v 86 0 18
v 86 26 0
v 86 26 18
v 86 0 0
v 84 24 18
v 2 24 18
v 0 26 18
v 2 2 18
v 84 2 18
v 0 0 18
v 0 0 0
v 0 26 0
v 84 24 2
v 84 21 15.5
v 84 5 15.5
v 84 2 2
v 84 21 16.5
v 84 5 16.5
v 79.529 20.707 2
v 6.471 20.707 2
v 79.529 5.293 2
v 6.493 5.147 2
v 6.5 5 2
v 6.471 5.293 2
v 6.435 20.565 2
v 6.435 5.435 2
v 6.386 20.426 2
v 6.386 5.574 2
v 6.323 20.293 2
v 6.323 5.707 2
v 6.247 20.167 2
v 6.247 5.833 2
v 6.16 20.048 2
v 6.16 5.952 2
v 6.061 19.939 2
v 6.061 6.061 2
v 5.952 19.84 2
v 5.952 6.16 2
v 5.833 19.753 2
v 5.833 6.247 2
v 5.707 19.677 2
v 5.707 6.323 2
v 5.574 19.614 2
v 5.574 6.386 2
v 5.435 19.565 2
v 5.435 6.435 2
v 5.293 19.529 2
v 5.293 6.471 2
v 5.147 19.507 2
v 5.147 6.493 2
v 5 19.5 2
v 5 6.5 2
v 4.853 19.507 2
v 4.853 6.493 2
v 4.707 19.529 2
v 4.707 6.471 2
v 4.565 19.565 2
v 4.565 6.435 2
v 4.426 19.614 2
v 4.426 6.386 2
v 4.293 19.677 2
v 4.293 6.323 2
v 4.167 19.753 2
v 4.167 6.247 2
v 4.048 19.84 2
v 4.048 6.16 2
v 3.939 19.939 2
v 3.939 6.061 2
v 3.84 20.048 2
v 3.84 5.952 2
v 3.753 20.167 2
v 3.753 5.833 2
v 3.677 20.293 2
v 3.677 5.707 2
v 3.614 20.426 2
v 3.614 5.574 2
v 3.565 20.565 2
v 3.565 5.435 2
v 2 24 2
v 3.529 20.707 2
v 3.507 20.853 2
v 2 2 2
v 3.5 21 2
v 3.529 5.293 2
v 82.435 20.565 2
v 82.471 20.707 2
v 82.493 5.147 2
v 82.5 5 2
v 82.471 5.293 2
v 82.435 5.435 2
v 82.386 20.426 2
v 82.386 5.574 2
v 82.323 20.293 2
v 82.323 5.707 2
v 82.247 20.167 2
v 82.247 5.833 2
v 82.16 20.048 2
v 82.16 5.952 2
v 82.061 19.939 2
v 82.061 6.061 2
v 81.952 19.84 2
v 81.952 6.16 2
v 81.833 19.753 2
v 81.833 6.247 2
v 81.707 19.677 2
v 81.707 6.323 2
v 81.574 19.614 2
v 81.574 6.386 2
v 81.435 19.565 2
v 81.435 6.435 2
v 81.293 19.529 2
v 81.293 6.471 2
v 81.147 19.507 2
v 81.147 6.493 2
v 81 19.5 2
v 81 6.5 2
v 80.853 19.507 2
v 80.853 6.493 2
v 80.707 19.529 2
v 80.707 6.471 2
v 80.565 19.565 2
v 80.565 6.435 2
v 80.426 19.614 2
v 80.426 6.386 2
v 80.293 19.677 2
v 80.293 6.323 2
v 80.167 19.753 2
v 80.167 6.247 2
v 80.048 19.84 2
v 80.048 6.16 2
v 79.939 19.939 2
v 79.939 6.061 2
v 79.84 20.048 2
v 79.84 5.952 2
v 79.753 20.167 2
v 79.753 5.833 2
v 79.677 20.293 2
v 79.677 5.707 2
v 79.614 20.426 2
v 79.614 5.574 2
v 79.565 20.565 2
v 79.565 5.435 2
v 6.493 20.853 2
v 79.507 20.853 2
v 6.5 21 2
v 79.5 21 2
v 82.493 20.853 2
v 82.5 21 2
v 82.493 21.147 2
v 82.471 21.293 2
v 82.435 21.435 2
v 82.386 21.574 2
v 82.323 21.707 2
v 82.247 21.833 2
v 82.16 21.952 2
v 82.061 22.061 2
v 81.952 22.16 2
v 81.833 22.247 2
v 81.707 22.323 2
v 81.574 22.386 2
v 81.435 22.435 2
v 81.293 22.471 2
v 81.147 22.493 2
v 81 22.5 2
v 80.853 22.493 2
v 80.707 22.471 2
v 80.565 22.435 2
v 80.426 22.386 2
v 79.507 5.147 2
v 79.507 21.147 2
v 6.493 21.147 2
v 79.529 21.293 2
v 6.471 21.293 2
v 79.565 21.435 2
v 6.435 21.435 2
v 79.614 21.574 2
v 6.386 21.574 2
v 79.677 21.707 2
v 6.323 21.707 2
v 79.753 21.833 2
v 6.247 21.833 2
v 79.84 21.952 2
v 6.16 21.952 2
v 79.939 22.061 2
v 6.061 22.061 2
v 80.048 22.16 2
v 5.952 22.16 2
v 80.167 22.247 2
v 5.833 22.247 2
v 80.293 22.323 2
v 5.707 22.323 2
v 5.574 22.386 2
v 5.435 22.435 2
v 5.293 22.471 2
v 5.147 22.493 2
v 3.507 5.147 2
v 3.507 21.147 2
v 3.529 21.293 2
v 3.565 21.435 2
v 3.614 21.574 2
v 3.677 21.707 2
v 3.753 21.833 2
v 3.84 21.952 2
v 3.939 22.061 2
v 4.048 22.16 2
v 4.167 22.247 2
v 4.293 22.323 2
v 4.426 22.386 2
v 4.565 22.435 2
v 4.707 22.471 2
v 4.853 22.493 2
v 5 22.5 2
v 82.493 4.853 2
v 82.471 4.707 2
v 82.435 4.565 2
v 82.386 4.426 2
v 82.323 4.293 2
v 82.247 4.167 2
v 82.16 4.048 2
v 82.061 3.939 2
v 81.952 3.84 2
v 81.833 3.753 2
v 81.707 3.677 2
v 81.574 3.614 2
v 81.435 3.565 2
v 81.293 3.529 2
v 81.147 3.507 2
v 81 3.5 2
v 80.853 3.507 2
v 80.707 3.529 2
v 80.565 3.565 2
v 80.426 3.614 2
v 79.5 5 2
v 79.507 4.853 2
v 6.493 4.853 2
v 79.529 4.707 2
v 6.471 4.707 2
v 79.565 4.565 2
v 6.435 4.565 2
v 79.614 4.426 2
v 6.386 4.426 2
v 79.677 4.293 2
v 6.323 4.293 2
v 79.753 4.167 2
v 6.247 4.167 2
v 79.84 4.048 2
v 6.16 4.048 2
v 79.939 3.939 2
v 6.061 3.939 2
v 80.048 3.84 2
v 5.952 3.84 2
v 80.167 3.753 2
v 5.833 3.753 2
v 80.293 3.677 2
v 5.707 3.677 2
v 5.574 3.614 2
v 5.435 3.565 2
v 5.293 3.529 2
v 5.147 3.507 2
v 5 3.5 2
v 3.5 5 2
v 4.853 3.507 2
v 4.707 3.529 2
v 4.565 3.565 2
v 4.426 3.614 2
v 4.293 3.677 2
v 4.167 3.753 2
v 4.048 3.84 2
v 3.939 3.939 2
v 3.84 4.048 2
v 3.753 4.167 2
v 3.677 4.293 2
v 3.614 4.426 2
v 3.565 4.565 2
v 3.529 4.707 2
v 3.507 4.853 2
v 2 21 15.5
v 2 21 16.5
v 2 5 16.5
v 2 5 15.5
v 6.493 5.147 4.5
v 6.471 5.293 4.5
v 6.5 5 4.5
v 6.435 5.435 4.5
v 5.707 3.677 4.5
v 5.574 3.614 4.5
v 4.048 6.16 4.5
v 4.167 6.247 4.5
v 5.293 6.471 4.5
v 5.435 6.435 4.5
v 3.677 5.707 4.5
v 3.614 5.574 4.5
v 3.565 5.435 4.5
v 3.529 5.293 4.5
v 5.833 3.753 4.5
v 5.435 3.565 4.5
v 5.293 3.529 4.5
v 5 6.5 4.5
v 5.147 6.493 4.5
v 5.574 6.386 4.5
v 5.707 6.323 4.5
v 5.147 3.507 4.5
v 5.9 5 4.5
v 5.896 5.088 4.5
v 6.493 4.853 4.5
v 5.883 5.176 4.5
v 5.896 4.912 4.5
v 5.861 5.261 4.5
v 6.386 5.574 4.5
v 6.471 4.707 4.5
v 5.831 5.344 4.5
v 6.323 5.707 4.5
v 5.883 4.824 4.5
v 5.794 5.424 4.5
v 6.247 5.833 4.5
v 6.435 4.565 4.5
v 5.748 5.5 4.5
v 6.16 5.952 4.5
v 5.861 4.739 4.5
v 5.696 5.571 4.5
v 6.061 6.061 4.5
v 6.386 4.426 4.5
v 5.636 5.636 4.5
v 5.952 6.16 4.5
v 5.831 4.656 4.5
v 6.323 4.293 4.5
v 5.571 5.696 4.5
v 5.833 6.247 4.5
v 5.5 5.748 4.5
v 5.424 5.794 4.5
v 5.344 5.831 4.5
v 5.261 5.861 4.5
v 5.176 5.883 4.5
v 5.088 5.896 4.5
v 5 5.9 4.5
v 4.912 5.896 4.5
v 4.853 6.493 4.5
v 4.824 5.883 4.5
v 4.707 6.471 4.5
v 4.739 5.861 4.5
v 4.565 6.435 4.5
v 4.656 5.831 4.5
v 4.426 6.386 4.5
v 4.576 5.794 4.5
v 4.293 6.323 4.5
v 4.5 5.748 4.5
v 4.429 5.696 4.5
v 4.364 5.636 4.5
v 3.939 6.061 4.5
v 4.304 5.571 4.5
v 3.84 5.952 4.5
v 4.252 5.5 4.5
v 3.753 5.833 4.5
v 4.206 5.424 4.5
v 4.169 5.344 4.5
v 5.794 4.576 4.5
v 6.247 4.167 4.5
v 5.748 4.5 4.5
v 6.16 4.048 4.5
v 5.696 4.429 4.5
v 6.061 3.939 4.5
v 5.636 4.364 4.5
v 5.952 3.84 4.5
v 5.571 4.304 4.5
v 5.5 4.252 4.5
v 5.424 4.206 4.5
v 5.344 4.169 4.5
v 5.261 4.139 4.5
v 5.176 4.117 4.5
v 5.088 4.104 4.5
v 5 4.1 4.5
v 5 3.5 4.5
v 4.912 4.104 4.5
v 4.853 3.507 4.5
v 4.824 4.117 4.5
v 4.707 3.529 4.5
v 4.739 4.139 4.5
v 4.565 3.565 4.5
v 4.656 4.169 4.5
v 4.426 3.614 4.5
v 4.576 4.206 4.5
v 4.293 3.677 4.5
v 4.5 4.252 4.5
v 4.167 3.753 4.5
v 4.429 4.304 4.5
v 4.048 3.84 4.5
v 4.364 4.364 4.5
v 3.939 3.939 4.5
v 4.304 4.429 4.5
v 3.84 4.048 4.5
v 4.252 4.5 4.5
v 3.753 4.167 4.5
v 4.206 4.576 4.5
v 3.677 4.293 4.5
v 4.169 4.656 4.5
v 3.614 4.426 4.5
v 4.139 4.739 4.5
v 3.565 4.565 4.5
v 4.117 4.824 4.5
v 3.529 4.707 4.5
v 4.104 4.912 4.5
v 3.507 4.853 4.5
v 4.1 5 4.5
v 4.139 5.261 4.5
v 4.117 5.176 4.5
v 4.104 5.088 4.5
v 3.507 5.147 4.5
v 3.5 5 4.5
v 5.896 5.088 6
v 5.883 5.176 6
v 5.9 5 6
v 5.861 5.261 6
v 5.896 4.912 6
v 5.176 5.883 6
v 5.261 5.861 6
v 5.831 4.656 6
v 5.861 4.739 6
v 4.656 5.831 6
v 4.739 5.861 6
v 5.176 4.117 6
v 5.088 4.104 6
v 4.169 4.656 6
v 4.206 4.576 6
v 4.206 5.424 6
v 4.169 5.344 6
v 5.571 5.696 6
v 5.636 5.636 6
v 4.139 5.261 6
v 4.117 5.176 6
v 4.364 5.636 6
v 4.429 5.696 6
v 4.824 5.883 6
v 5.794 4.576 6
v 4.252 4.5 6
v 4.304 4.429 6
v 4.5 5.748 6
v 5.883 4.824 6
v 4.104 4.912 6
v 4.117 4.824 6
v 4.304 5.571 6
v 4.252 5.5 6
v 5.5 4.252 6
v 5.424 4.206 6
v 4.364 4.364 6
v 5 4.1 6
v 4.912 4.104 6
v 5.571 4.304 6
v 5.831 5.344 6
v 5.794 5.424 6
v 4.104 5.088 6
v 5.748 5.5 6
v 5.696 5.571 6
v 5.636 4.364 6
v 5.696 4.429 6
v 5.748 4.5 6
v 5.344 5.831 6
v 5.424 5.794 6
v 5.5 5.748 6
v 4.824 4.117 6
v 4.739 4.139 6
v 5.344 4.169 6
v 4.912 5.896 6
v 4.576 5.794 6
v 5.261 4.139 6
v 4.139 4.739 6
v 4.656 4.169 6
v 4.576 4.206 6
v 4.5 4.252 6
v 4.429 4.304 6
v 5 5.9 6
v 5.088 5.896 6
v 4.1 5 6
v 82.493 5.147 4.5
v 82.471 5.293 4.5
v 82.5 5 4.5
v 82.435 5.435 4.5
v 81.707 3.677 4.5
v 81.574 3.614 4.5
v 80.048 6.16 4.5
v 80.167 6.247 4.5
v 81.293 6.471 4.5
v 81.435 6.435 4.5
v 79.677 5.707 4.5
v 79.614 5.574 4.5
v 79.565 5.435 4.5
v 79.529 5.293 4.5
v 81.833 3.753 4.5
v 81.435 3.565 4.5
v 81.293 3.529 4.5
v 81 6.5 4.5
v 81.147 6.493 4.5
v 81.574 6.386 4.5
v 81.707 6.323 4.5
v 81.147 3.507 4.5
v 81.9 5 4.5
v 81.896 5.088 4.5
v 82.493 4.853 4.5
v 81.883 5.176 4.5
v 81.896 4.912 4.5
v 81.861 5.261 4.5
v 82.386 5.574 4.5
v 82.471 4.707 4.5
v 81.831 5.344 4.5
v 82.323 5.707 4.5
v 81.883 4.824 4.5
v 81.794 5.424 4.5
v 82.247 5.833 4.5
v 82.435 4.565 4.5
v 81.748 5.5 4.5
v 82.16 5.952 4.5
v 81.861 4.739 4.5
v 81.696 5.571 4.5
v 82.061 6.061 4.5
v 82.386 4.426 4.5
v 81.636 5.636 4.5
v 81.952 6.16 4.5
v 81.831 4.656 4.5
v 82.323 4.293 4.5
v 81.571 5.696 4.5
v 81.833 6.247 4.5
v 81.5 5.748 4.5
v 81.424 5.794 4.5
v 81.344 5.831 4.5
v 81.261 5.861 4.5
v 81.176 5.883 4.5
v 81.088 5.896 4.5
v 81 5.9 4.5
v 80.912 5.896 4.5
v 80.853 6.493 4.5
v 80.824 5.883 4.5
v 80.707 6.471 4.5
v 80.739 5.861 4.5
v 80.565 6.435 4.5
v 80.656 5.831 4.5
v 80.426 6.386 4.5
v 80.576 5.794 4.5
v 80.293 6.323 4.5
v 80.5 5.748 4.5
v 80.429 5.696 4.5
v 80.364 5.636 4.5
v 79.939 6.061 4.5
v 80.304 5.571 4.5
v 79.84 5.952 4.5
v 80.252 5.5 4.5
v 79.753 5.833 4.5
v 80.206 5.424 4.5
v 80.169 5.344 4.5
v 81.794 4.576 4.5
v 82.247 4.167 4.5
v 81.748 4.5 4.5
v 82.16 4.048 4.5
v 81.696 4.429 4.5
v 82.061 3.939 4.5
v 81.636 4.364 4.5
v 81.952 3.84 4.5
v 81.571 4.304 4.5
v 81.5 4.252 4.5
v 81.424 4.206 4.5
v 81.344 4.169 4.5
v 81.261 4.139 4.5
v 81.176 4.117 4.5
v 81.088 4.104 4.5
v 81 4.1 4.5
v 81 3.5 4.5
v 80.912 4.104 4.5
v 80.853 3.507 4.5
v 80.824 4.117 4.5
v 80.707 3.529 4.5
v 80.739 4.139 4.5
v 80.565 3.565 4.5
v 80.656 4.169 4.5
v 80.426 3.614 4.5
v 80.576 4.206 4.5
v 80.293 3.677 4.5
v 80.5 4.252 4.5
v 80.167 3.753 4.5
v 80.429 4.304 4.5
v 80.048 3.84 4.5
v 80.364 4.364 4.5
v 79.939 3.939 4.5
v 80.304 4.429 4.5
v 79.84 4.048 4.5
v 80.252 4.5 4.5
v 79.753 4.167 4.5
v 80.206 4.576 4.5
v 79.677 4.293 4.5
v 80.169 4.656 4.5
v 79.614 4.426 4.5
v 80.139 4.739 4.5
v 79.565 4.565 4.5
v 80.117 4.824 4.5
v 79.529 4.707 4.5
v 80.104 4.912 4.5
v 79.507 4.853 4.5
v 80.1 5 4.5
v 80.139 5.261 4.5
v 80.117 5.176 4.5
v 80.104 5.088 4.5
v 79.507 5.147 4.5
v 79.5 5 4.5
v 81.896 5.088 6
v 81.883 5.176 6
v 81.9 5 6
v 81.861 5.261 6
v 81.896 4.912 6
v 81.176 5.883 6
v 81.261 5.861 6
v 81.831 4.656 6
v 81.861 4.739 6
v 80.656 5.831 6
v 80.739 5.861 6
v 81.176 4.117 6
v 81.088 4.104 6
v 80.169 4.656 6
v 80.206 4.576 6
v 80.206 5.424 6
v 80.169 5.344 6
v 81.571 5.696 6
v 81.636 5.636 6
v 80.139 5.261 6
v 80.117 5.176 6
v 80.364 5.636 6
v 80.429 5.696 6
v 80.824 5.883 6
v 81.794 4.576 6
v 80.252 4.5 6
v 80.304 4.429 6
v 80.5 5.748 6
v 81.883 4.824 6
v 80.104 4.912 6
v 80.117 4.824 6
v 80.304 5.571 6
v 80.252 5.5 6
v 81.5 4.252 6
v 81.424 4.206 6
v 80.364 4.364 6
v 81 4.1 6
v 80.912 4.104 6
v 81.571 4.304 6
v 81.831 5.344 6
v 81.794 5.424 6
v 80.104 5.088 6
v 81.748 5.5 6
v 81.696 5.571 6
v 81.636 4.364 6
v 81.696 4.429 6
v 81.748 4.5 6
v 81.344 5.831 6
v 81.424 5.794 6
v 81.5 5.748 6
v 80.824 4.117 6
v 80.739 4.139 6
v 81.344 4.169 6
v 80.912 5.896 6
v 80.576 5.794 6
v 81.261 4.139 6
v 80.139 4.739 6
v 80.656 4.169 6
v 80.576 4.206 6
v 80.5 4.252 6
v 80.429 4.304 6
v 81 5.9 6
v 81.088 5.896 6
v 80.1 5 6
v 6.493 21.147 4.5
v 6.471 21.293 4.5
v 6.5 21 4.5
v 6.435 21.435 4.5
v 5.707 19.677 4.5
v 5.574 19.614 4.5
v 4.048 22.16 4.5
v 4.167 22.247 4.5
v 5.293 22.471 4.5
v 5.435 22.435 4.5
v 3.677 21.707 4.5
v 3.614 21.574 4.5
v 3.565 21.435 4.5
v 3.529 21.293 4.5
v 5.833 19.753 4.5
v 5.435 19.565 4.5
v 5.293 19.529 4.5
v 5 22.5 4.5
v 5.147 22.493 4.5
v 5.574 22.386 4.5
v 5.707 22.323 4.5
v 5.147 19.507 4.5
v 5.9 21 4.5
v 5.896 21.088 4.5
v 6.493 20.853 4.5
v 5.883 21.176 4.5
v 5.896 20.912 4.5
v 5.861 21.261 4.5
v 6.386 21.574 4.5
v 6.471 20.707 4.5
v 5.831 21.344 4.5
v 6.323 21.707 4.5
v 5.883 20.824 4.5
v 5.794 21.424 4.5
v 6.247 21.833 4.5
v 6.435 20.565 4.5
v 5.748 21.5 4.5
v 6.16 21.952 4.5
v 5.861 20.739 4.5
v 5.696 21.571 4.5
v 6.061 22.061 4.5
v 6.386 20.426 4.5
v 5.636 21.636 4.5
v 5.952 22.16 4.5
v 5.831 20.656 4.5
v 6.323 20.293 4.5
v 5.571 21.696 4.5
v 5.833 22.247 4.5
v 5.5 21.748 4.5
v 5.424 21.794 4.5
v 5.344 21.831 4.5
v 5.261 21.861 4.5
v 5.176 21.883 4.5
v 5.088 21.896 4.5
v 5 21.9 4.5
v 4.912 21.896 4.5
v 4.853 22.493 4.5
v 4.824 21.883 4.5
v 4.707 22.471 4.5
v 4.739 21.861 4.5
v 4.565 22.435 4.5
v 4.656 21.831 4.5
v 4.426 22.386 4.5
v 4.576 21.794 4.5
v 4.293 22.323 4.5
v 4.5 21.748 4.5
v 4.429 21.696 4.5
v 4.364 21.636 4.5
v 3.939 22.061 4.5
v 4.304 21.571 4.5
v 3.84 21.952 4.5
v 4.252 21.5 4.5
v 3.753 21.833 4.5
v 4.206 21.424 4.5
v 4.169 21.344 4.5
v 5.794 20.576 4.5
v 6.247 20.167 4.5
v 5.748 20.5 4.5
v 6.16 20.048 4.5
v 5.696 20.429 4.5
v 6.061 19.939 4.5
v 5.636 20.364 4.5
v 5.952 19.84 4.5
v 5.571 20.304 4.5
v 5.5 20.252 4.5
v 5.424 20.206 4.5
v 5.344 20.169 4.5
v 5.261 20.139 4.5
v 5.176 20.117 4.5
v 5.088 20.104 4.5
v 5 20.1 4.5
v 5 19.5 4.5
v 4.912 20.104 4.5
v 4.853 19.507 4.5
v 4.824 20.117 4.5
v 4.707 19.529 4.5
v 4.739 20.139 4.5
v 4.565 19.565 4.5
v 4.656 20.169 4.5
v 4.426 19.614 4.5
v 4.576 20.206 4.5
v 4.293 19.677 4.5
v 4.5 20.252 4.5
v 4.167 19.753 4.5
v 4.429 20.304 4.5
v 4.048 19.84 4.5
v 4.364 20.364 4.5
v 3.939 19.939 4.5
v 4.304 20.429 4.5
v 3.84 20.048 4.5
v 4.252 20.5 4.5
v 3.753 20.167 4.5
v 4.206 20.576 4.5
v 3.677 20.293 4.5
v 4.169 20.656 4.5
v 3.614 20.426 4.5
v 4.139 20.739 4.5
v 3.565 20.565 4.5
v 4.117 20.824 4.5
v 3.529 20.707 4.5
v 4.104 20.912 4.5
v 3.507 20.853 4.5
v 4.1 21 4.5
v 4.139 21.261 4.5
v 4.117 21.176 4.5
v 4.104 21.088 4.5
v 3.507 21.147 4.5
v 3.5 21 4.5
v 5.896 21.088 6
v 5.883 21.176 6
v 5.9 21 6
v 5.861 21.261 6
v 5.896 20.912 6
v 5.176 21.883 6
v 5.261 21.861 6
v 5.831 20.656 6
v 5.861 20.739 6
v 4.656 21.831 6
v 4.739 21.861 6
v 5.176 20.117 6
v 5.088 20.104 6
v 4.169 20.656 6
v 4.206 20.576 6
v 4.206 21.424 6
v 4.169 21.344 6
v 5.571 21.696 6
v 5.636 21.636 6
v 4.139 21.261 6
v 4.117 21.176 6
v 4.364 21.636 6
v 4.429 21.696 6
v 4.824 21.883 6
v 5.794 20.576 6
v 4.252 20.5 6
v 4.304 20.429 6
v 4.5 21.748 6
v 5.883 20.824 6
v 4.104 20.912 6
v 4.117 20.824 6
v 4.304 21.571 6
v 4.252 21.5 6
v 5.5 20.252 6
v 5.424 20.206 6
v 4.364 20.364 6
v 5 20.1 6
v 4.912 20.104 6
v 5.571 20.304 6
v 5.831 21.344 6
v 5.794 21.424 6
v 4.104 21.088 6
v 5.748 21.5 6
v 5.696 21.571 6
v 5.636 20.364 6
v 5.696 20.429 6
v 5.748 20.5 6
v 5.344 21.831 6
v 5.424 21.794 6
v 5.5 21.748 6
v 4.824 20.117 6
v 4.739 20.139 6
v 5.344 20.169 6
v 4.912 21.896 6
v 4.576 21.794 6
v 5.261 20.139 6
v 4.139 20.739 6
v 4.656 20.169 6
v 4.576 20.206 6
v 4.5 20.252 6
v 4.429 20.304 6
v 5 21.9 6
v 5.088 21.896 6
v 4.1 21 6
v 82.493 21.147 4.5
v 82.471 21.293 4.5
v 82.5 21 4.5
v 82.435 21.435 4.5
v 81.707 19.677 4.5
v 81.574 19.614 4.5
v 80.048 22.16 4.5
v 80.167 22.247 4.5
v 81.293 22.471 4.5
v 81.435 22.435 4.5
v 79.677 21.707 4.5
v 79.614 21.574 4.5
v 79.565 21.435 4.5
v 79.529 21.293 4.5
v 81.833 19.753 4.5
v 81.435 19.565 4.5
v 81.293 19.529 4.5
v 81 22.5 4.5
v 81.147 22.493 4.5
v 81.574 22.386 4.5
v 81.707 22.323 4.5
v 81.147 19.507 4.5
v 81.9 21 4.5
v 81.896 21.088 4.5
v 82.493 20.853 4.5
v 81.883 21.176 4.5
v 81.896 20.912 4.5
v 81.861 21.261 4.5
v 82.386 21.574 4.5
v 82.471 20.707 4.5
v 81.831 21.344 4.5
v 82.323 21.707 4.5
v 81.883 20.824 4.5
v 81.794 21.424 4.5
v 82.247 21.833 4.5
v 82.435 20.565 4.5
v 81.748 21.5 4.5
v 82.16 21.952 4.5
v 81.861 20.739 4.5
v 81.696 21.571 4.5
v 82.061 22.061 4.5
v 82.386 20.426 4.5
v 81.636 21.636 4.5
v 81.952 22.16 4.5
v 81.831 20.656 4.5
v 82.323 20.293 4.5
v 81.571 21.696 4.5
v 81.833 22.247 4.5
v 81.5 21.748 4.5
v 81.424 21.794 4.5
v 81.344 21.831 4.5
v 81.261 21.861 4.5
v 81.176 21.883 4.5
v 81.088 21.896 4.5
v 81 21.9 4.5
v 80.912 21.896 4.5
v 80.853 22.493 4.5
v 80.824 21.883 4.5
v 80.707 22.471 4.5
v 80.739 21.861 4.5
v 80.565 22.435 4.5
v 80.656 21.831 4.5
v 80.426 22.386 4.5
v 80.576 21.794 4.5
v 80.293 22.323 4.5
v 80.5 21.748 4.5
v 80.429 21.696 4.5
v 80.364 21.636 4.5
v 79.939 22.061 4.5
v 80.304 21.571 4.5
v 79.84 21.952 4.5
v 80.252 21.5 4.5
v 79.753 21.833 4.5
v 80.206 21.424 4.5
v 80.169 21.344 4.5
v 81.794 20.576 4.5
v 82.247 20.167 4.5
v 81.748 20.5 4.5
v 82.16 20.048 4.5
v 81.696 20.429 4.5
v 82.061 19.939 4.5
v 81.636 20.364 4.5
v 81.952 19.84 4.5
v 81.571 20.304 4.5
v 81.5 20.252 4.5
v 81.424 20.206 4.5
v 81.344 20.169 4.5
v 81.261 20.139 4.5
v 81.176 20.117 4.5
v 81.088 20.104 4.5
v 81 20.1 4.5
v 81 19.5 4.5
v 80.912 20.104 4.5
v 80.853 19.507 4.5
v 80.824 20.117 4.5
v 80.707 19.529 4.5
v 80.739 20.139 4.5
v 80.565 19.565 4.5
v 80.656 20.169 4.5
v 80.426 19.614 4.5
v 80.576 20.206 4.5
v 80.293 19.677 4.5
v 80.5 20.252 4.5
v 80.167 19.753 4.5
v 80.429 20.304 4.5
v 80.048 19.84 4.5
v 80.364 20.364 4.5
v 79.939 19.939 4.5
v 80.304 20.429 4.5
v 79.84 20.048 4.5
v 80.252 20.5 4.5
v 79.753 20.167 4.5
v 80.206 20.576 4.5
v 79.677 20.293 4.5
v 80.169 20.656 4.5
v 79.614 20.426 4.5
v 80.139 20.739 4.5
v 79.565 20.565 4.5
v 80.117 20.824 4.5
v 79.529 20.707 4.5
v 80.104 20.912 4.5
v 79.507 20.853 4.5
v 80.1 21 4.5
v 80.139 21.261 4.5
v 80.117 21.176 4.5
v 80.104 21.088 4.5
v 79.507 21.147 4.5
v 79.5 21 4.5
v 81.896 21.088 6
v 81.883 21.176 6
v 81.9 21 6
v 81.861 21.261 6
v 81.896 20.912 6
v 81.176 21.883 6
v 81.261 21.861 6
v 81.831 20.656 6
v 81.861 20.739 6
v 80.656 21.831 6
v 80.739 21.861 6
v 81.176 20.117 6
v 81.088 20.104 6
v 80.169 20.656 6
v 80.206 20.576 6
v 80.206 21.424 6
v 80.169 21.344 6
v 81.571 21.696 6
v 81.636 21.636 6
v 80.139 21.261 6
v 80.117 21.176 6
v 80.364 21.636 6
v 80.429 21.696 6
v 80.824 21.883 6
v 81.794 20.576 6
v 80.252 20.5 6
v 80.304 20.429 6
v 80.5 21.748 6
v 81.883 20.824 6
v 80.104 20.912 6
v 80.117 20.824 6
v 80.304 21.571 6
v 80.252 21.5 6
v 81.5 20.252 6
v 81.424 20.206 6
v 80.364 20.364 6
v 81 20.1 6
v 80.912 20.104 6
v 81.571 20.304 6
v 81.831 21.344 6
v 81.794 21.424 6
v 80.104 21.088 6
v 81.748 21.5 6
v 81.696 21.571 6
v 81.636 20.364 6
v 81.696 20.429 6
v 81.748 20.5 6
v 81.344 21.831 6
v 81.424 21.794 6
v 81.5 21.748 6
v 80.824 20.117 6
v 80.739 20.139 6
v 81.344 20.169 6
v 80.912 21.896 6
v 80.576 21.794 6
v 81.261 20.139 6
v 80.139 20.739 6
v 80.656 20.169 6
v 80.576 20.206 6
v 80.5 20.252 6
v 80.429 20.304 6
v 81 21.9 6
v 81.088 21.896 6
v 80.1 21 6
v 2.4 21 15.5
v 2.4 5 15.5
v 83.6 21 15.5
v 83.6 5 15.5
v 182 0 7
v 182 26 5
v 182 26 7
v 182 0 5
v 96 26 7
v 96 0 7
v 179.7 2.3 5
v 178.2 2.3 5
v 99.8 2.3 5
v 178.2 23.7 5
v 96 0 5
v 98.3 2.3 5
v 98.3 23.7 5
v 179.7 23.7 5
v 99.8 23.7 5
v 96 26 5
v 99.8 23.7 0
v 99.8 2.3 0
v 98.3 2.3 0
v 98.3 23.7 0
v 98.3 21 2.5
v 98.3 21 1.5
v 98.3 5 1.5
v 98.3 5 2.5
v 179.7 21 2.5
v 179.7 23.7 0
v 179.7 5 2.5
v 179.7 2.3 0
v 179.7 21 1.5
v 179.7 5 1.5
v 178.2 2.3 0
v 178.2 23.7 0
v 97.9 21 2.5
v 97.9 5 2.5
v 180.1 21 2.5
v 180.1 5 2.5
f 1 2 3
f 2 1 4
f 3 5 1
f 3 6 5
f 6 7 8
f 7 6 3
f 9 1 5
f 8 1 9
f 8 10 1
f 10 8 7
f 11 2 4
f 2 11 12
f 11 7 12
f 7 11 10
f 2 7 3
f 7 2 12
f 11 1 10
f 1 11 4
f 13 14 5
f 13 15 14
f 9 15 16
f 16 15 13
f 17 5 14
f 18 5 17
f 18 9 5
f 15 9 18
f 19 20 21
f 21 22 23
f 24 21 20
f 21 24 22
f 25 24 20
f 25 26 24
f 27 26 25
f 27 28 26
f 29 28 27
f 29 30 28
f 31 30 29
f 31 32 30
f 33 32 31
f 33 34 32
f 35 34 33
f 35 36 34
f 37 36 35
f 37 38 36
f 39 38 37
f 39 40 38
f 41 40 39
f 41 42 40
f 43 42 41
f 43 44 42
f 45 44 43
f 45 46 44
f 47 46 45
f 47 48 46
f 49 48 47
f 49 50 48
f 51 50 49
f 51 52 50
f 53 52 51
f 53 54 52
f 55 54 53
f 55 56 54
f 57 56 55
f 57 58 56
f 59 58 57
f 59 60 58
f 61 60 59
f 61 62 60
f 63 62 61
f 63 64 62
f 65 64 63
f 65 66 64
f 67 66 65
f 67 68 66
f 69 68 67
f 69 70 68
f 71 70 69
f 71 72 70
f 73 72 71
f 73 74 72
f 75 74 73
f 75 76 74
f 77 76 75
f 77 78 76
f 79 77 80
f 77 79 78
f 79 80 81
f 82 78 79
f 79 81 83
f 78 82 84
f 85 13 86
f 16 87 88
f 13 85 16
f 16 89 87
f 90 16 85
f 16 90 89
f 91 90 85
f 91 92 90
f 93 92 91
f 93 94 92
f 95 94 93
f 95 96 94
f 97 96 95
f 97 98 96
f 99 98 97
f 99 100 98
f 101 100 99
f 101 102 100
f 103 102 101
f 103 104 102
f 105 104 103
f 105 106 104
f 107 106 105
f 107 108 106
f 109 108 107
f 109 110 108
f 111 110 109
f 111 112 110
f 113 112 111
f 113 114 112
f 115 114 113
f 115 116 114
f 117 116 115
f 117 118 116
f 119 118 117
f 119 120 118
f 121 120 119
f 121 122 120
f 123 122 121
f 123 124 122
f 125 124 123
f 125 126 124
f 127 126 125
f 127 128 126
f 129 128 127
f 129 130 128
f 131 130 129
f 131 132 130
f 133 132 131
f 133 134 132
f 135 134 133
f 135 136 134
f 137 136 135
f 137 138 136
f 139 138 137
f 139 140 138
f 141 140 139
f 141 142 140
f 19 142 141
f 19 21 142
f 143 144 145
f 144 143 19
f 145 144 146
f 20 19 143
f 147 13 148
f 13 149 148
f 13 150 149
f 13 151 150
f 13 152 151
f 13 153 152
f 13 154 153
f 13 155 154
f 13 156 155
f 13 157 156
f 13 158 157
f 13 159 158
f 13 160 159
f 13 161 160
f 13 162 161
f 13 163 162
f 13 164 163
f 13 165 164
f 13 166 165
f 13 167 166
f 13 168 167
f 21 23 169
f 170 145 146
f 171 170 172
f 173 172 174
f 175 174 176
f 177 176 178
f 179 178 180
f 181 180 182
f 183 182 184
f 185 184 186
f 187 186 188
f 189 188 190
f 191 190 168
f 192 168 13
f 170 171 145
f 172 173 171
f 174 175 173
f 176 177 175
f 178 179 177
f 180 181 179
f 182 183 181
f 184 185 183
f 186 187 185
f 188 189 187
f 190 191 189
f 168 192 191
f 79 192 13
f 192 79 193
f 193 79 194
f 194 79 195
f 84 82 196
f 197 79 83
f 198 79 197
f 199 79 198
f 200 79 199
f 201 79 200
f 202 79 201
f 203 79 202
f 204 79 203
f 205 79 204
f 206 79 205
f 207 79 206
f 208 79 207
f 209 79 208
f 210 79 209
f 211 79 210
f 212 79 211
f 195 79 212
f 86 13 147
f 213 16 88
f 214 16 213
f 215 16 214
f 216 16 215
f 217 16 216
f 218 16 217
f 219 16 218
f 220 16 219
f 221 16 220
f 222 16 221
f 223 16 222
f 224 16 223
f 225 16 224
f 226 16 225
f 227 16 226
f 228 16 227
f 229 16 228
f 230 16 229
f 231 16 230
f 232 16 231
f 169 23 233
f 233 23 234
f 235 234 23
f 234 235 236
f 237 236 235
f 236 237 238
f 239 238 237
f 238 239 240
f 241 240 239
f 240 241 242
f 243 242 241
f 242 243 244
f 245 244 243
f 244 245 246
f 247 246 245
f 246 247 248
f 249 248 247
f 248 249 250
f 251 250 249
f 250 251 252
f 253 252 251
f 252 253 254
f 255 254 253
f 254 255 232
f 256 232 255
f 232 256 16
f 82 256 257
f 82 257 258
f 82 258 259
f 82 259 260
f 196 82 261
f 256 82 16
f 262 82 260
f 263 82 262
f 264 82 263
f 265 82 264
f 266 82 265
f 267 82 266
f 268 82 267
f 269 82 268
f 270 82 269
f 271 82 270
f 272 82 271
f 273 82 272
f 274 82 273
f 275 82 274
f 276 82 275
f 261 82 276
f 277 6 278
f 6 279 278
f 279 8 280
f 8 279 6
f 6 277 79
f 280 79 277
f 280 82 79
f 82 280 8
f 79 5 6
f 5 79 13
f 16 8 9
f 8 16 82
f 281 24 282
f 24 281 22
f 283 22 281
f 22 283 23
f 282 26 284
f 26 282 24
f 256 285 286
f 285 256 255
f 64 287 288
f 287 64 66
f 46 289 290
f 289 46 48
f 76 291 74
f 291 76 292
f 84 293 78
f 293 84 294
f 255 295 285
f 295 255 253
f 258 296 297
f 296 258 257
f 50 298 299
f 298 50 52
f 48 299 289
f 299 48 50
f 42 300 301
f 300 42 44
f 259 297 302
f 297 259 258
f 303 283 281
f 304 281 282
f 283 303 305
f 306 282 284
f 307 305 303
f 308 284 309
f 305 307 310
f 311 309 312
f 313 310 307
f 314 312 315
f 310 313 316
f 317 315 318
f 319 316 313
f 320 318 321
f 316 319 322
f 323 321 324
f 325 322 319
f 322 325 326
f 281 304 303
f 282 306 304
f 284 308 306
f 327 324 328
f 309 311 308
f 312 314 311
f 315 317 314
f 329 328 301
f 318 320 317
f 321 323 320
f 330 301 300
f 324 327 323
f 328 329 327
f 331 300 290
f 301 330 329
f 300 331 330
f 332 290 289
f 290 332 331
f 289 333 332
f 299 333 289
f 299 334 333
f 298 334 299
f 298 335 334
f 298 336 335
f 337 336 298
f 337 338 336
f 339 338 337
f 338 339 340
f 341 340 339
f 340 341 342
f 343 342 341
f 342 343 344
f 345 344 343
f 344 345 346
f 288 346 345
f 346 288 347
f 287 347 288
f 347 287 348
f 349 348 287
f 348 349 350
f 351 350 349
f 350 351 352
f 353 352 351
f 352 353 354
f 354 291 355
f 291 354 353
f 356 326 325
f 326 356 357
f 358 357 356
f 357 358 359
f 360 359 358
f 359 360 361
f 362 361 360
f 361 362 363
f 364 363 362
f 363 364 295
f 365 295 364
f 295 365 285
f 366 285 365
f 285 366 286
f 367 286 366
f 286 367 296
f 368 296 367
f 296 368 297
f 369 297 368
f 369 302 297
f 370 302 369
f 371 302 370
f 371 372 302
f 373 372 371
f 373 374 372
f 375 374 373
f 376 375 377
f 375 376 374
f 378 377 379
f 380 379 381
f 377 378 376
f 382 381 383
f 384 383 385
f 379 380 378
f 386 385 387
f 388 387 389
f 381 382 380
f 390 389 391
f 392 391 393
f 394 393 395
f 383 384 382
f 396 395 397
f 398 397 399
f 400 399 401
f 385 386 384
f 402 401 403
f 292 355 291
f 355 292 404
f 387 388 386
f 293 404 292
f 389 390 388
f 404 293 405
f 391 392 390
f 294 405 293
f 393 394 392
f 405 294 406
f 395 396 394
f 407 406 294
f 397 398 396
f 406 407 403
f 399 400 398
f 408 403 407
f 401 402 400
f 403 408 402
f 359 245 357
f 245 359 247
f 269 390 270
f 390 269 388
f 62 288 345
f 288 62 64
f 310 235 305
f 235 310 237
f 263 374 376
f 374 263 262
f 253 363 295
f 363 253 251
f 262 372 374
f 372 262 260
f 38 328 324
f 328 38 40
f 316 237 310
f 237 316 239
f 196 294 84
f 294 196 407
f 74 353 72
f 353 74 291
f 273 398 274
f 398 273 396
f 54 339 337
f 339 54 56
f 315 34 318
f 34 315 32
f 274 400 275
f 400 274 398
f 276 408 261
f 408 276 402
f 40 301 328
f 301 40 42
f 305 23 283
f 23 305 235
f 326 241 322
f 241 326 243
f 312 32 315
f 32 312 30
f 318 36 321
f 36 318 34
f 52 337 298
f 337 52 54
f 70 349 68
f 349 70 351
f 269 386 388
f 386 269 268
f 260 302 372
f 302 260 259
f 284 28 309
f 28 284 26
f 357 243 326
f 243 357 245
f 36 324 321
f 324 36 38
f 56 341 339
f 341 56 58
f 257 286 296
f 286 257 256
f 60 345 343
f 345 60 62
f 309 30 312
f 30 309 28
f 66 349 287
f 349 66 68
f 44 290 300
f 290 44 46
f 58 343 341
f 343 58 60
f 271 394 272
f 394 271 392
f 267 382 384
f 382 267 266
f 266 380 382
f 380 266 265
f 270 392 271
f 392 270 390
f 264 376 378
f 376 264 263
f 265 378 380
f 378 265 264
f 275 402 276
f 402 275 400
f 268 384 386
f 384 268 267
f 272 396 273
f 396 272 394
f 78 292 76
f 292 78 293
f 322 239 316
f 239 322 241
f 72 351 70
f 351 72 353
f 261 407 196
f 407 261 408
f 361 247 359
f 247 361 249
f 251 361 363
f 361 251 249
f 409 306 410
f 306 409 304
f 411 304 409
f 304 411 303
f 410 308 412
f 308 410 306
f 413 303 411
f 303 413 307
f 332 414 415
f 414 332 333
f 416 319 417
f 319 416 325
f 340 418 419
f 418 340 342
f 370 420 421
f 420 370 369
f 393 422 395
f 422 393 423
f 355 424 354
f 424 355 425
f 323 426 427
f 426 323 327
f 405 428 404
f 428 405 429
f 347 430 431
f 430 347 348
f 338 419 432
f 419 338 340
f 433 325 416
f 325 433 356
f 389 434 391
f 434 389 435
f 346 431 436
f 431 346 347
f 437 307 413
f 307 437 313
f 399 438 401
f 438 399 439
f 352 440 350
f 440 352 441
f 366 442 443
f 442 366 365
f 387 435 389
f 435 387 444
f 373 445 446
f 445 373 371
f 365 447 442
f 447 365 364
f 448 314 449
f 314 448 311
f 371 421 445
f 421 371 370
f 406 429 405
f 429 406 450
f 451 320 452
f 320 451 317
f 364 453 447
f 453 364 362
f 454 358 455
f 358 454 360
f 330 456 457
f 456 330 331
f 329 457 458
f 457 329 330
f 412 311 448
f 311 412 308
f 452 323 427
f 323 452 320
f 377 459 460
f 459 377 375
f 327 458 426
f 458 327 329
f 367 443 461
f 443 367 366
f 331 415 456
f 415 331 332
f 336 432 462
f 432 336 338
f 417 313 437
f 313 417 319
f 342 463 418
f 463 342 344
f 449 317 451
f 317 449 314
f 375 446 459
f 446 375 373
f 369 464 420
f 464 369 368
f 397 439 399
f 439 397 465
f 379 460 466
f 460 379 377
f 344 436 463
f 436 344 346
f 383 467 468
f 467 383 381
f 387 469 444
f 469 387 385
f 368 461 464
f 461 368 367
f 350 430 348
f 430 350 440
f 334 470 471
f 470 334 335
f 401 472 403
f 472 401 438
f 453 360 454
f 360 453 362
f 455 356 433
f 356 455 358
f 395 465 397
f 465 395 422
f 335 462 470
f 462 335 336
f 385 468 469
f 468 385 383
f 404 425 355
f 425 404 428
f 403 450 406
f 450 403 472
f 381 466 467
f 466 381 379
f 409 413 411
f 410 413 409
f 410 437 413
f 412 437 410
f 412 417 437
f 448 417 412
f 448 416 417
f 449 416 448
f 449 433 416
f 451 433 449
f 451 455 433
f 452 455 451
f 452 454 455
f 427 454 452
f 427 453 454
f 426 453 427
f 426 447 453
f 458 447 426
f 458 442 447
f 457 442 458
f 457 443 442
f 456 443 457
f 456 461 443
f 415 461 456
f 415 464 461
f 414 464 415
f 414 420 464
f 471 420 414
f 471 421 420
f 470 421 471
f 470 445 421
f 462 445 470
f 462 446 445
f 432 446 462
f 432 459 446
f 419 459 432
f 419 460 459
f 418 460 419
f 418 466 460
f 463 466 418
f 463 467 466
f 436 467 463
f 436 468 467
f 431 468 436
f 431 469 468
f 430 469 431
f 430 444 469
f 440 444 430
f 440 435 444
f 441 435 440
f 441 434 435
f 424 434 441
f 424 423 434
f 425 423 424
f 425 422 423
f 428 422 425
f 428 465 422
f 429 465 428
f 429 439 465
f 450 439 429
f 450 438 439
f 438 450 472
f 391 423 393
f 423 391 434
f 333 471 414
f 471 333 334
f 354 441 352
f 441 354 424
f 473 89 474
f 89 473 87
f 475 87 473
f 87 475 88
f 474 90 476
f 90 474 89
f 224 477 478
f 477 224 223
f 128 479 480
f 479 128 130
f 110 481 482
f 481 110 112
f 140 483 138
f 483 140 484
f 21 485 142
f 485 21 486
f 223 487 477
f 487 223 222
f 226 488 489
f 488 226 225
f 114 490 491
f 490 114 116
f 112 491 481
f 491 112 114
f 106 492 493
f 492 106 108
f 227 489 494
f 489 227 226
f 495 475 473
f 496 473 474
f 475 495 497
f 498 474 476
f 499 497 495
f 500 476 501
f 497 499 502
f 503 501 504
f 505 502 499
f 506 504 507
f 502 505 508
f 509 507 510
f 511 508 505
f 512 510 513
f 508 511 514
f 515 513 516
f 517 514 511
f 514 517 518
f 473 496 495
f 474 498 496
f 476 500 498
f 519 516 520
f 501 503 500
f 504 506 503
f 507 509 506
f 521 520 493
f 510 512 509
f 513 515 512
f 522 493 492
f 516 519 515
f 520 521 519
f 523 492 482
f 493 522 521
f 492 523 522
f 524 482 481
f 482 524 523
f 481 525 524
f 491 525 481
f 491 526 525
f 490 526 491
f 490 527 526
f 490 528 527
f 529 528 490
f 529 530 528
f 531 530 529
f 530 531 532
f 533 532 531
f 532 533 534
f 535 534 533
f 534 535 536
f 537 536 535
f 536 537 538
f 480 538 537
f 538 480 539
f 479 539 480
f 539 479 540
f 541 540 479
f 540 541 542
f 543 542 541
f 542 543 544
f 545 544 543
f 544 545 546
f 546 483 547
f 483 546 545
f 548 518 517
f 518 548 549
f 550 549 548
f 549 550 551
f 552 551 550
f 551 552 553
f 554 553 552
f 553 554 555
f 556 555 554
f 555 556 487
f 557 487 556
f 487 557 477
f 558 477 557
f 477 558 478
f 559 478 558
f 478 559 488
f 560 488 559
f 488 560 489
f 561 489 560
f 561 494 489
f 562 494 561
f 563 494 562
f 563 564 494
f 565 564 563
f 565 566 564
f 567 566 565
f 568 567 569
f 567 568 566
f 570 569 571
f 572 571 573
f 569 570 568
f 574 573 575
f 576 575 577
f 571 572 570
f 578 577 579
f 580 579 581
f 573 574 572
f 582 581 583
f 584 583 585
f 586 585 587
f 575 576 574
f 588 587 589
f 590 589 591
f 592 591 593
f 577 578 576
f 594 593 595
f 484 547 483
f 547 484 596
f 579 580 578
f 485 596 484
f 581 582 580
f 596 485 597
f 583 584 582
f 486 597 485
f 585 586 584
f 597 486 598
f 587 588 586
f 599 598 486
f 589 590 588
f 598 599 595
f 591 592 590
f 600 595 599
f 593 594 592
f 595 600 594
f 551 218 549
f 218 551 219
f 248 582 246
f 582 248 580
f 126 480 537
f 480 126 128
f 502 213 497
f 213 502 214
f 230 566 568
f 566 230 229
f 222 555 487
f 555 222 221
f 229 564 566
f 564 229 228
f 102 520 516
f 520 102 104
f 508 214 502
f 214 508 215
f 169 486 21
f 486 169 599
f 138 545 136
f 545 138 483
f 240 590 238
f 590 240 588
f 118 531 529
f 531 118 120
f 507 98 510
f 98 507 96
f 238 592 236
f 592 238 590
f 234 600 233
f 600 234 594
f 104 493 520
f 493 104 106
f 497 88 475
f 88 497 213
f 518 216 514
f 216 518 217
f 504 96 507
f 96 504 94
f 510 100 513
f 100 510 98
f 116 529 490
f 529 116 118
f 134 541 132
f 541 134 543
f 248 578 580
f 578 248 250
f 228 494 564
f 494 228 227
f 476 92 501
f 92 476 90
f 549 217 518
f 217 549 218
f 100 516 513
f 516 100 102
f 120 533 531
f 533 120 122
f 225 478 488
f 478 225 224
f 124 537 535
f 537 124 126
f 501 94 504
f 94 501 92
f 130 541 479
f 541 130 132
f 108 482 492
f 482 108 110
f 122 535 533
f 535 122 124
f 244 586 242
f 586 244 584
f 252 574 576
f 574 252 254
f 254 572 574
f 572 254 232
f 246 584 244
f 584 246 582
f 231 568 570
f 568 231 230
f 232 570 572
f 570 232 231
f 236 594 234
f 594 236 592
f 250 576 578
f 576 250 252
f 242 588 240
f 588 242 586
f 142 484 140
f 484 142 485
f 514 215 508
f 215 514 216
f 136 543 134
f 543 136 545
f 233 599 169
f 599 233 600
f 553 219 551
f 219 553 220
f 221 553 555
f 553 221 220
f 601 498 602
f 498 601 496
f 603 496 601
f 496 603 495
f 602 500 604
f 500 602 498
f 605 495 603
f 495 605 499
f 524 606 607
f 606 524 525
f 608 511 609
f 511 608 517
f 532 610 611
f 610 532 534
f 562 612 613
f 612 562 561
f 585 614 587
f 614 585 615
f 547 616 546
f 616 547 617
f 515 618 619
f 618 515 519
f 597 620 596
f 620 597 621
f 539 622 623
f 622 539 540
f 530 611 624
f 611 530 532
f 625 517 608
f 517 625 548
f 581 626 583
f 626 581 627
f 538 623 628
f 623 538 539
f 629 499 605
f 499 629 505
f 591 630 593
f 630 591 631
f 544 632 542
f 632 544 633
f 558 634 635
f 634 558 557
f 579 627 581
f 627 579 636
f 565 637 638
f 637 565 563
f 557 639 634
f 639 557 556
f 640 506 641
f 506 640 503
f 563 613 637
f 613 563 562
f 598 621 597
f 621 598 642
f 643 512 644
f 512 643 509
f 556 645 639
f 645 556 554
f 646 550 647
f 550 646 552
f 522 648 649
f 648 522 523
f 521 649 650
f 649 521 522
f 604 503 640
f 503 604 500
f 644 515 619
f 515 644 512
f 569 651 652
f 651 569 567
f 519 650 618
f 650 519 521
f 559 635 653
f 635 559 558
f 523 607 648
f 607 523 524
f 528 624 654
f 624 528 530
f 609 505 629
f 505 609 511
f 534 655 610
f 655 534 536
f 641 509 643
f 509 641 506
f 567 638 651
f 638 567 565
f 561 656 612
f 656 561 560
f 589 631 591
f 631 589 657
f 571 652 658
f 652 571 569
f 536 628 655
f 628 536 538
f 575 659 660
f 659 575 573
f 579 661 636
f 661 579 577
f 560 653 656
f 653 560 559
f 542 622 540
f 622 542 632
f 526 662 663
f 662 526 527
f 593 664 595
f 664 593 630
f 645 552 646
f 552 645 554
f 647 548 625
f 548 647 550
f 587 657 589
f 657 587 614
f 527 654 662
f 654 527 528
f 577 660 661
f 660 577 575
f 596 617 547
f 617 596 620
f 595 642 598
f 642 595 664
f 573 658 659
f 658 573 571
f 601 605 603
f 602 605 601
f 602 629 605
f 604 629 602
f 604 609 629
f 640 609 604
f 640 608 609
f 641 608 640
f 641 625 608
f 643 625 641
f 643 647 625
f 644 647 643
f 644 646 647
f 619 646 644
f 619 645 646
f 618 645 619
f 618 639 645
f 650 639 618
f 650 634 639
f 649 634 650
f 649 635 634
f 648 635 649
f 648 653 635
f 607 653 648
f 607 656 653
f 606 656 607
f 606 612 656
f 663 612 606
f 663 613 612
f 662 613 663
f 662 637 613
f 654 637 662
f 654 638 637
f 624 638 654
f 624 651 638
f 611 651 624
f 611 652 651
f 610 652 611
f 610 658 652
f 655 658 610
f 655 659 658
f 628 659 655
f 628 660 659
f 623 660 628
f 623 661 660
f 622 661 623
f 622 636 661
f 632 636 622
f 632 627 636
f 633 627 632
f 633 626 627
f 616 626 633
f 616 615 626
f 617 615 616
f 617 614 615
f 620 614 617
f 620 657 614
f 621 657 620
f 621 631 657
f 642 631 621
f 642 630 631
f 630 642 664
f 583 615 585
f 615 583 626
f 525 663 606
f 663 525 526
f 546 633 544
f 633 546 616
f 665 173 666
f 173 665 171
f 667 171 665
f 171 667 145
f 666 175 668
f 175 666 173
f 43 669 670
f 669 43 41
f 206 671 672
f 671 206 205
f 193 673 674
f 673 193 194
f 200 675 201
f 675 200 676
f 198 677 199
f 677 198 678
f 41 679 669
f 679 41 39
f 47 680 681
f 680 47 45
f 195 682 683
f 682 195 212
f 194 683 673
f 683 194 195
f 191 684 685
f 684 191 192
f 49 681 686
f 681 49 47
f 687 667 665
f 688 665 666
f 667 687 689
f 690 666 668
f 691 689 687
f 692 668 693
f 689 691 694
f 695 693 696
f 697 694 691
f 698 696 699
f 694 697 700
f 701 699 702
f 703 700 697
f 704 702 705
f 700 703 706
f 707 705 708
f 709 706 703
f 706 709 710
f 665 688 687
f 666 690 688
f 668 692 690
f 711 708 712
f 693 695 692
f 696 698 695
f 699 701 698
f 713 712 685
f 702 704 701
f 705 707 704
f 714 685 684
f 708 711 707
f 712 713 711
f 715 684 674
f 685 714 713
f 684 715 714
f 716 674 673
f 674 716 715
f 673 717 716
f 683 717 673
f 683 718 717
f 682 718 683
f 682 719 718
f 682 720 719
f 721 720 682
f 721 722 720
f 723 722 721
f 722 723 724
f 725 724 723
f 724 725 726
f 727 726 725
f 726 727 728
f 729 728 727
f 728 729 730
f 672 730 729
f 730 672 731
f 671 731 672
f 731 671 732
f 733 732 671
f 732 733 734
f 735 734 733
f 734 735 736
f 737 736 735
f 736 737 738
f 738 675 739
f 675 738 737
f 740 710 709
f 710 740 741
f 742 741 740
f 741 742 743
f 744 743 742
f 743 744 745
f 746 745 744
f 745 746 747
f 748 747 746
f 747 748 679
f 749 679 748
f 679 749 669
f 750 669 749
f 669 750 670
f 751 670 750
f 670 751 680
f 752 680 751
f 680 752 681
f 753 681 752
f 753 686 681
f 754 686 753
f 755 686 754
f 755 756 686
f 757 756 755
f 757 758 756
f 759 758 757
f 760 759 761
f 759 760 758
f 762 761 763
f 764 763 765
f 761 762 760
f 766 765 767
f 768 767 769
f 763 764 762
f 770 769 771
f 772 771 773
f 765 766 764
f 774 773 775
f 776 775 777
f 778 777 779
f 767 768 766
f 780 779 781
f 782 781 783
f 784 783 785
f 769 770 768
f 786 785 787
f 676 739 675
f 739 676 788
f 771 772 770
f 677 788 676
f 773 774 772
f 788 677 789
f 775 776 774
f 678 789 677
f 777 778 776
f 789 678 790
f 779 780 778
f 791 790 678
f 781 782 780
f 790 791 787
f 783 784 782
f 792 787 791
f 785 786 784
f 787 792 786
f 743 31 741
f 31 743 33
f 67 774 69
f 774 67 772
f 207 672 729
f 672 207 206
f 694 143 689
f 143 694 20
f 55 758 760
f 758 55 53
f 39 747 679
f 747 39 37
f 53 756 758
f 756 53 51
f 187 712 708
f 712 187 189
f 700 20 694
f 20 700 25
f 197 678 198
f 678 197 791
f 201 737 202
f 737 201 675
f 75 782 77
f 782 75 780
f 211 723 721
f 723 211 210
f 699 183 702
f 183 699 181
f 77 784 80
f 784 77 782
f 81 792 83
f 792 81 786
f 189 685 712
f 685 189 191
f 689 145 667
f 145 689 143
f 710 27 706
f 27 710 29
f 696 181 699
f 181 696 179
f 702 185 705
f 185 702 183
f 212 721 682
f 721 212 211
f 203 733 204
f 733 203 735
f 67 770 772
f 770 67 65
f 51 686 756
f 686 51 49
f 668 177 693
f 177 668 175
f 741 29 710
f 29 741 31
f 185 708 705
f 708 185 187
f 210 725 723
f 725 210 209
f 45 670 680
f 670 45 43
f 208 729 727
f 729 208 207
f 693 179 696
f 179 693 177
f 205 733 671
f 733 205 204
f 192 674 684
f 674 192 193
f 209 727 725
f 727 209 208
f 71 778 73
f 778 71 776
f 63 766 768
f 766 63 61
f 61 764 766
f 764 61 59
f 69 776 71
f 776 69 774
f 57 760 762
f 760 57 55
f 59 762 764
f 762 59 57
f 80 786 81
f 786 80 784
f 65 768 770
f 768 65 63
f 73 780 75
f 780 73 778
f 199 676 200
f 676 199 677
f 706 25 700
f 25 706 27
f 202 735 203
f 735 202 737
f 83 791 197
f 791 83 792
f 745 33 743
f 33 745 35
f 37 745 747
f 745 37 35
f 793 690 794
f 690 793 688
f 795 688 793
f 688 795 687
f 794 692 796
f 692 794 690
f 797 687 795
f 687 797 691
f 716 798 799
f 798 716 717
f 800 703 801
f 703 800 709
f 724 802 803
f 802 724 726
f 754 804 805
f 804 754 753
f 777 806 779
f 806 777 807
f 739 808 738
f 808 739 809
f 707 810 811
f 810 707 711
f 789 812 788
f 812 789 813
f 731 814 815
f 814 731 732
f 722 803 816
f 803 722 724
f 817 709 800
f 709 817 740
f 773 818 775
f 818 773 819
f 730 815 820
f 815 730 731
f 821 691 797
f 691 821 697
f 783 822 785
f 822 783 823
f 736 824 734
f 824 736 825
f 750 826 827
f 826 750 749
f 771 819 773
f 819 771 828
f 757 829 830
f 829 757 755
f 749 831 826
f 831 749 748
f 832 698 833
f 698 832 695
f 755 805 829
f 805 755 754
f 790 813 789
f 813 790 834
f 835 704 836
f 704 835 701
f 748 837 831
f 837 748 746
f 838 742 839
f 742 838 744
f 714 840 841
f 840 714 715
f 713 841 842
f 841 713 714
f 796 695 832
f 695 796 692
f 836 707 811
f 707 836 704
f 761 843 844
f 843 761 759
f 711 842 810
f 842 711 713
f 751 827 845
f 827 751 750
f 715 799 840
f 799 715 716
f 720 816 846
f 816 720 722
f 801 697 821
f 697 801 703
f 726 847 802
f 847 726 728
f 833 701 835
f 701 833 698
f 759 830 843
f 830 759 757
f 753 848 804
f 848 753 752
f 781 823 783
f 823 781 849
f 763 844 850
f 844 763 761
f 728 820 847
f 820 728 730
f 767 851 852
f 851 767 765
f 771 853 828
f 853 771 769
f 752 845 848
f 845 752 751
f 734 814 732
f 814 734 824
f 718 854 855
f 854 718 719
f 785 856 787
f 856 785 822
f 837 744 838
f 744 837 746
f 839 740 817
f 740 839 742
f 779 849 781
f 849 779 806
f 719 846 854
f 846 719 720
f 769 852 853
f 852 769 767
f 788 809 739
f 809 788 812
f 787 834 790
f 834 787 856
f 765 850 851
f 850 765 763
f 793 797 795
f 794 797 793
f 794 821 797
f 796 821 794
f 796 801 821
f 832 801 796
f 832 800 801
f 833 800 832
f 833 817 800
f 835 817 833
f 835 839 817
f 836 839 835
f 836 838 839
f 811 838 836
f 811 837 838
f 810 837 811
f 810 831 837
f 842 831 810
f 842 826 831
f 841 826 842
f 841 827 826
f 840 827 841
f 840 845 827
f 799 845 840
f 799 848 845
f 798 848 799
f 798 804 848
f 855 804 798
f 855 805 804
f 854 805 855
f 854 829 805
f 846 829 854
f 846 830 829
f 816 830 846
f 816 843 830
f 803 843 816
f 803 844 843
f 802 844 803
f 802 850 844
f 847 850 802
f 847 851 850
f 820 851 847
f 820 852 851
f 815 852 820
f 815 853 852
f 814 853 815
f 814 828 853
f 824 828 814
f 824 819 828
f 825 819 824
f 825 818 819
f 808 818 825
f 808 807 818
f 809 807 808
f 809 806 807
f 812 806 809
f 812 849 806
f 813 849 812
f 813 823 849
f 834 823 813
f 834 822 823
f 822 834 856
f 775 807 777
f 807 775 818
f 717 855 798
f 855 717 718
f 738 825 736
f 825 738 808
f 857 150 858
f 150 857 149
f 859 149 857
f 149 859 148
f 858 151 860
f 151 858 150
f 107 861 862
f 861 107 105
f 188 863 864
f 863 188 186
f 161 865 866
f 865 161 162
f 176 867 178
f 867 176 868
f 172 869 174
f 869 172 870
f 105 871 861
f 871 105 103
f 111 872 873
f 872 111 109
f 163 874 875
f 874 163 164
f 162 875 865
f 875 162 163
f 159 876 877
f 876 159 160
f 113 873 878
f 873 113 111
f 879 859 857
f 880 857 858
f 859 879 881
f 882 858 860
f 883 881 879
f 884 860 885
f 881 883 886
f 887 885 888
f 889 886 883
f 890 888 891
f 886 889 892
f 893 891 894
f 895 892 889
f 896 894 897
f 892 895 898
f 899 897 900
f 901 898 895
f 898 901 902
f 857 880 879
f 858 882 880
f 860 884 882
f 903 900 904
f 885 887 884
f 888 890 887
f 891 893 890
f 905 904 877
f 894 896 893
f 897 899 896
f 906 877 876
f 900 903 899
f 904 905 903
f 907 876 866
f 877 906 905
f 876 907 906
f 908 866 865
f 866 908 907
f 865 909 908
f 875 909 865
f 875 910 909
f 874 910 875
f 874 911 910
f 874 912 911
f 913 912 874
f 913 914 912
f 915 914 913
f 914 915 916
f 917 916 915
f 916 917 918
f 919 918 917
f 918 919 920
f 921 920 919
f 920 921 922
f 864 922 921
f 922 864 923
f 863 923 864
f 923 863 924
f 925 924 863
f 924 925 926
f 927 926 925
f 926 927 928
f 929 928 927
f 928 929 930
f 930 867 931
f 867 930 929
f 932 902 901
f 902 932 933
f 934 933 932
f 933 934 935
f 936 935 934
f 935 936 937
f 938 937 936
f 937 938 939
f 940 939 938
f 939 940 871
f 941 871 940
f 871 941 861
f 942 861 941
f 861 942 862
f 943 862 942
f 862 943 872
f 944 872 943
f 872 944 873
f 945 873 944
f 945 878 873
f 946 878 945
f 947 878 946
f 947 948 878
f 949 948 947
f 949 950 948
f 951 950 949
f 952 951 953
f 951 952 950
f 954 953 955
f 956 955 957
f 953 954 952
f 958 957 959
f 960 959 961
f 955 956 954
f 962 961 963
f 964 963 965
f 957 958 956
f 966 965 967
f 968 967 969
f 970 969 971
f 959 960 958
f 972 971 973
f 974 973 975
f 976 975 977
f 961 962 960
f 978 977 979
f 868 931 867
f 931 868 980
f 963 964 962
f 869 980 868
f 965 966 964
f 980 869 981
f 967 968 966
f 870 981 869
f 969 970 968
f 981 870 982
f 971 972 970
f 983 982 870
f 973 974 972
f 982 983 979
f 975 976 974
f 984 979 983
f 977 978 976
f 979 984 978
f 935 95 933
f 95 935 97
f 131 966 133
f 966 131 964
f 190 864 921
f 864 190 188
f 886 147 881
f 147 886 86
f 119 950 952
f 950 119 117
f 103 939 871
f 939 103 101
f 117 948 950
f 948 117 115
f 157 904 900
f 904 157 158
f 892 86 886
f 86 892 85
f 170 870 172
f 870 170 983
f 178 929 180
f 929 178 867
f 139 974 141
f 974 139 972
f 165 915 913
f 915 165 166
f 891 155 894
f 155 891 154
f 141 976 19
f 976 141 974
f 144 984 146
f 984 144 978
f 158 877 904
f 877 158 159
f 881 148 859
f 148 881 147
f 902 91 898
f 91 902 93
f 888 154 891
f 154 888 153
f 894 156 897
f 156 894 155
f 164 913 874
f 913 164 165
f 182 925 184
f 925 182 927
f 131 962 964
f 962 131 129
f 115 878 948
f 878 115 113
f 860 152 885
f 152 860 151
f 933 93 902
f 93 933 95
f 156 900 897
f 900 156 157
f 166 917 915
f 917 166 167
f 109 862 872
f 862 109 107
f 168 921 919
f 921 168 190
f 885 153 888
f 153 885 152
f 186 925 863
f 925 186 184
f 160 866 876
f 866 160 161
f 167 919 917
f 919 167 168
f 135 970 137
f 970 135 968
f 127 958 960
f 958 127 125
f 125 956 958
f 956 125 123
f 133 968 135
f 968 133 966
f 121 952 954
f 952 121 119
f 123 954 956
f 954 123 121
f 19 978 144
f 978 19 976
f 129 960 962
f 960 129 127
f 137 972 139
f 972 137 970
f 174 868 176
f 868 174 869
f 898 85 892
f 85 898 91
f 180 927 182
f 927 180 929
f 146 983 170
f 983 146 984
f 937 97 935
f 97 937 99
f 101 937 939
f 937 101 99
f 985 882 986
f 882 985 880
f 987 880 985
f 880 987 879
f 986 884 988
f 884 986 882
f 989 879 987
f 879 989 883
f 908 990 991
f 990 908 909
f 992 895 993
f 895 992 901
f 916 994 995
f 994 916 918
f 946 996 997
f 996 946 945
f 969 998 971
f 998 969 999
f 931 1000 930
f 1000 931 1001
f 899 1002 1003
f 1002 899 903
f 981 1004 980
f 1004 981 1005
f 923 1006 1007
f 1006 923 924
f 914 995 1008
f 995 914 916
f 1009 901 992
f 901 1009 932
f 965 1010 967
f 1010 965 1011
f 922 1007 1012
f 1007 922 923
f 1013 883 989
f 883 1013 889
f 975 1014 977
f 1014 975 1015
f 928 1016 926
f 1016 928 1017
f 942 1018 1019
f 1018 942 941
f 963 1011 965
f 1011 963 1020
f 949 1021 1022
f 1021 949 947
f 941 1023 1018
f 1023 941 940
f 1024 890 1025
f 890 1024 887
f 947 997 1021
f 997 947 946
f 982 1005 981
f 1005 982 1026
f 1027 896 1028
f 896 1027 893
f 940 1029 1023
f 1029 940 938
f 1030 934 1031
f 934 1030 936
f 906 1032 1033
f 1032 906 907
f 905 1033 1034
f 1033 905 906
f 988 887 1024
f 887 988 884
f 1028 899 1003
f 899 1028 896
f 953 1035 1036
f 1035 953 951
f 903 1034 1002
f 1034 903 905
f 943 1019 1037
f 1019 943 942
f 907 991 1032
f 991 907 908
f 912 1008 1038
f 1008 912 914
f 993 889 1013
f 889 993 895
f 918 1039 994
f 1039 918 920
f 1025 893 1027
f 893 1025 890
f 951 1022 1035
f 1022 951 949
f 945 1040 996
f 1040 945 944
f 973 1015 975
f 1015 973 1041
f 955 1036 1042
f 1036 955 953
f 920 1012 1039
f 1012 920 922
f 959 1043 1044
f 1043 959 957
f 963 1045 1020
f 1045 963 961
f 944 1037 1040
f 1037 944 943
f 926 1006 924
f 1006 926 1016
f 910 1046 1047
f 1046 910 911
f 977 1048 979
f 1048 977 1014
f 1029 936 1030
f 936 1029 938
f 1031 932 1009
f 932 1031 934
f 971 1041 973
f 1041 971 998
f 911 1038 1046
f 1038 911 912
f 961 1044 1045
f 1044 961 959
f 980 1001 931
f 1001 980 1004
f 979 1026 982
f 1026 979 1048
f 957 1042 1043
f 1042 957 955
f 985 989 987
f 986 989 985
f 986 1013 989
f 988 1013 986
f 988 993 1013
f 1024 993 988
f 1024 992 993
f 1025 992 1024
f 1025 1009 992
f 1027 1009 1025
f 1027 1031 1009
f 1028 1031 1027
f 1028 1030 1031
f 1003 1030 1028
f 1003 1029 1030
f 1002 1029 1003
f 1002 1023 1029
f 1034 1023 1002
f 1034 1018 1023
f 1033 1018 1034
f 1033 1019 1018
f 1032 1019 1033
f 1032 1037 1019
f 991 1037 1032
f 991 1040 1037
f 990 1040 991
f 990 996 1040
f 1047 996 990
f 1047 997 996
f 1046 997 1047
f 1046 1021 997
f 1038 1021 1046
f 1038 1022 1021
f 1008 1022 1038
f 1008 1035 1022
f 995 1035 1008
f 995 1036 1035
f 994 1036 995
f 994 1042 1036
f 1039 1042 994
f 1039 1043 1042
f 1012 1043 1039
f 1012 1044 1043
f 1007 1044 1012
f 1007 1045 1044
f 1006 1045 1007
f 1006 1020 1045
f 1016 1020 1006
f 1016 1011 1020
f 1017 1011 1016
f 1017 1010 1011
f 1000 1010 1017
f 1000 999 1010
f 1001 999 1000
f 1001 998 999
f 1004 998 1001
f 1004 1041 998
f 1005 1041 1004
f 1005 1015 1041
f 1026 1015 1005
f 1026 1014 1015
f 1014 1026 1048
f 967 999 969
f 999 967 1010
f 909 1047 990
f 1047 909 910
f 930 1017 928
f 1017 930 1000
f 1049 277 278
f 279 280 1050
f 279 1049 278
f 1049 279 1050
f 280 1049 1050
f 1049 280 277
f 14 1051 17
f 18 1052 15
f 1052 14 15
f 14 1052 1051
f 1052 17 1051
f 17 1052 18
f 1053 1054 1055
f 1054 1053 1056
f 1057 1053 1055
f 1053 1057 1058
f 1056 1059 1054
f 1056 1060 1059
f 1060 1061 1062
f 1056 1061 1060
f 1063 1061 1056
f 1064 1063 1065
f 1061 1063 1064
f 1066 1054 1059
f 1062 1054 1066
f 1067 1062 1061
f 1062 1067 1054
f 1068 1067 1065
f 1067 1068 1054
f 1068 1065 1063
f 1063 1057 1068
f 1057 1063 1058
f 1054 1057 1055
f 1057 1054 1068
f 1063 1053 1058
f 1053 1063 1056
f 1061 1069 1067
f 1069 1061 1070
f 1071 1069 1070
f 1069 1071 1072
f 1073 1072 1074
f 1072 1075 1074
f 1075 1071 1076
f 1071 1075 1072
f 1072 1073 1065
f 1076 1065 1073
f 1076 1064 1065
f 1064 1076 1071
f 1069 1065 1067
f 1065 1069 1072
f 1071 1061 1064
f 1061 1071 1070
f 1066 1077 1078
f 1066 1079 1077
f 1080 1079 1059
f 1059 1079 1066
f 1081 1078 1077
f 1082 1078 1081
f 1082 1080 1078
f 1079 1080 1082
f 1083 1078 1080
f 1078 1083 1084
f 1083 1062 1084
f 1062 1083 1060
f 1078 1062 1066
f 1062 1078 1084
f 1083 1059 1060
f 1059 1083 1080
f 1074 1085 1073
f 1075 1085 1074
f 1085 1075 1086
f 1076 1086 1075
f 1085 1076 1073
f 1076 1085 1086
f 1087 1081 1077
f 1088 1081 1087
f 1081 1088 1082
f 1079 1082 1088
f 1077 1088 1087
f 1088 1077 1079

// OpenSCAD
// Generic case for a 20 x 80 mm perfboard / breadboard PCB (6 x 28 holes).
// Assumes 2 mm corner mounting holes with 1 mm edge inset, like the ESP board.
//
// No wall cutouts defined yet -- add them to the `cutouts` list when you
// know where the USB / wires / buttons need to come out. See pcb_case.scad
// for the wall labels and cutout spec.

use <../pcb_case.scad>;

pcb_case(
    // long axis along X
    pcb_length          = 80,
    pcb_width           = 20,
    pcb_thickness       = 1.5,
    pcb_hole_d          = 2.0,
    pcb_hole_edge_inset = 1.0,

    bottom_clearance    = 2.5,
    top_clearance       = 12.0,
    pcb_side_clearance  = 1.0,

    cutouts = [
        // example: ["bd", 6, 10, 0, 6],
    ],

    show = "all"
);
